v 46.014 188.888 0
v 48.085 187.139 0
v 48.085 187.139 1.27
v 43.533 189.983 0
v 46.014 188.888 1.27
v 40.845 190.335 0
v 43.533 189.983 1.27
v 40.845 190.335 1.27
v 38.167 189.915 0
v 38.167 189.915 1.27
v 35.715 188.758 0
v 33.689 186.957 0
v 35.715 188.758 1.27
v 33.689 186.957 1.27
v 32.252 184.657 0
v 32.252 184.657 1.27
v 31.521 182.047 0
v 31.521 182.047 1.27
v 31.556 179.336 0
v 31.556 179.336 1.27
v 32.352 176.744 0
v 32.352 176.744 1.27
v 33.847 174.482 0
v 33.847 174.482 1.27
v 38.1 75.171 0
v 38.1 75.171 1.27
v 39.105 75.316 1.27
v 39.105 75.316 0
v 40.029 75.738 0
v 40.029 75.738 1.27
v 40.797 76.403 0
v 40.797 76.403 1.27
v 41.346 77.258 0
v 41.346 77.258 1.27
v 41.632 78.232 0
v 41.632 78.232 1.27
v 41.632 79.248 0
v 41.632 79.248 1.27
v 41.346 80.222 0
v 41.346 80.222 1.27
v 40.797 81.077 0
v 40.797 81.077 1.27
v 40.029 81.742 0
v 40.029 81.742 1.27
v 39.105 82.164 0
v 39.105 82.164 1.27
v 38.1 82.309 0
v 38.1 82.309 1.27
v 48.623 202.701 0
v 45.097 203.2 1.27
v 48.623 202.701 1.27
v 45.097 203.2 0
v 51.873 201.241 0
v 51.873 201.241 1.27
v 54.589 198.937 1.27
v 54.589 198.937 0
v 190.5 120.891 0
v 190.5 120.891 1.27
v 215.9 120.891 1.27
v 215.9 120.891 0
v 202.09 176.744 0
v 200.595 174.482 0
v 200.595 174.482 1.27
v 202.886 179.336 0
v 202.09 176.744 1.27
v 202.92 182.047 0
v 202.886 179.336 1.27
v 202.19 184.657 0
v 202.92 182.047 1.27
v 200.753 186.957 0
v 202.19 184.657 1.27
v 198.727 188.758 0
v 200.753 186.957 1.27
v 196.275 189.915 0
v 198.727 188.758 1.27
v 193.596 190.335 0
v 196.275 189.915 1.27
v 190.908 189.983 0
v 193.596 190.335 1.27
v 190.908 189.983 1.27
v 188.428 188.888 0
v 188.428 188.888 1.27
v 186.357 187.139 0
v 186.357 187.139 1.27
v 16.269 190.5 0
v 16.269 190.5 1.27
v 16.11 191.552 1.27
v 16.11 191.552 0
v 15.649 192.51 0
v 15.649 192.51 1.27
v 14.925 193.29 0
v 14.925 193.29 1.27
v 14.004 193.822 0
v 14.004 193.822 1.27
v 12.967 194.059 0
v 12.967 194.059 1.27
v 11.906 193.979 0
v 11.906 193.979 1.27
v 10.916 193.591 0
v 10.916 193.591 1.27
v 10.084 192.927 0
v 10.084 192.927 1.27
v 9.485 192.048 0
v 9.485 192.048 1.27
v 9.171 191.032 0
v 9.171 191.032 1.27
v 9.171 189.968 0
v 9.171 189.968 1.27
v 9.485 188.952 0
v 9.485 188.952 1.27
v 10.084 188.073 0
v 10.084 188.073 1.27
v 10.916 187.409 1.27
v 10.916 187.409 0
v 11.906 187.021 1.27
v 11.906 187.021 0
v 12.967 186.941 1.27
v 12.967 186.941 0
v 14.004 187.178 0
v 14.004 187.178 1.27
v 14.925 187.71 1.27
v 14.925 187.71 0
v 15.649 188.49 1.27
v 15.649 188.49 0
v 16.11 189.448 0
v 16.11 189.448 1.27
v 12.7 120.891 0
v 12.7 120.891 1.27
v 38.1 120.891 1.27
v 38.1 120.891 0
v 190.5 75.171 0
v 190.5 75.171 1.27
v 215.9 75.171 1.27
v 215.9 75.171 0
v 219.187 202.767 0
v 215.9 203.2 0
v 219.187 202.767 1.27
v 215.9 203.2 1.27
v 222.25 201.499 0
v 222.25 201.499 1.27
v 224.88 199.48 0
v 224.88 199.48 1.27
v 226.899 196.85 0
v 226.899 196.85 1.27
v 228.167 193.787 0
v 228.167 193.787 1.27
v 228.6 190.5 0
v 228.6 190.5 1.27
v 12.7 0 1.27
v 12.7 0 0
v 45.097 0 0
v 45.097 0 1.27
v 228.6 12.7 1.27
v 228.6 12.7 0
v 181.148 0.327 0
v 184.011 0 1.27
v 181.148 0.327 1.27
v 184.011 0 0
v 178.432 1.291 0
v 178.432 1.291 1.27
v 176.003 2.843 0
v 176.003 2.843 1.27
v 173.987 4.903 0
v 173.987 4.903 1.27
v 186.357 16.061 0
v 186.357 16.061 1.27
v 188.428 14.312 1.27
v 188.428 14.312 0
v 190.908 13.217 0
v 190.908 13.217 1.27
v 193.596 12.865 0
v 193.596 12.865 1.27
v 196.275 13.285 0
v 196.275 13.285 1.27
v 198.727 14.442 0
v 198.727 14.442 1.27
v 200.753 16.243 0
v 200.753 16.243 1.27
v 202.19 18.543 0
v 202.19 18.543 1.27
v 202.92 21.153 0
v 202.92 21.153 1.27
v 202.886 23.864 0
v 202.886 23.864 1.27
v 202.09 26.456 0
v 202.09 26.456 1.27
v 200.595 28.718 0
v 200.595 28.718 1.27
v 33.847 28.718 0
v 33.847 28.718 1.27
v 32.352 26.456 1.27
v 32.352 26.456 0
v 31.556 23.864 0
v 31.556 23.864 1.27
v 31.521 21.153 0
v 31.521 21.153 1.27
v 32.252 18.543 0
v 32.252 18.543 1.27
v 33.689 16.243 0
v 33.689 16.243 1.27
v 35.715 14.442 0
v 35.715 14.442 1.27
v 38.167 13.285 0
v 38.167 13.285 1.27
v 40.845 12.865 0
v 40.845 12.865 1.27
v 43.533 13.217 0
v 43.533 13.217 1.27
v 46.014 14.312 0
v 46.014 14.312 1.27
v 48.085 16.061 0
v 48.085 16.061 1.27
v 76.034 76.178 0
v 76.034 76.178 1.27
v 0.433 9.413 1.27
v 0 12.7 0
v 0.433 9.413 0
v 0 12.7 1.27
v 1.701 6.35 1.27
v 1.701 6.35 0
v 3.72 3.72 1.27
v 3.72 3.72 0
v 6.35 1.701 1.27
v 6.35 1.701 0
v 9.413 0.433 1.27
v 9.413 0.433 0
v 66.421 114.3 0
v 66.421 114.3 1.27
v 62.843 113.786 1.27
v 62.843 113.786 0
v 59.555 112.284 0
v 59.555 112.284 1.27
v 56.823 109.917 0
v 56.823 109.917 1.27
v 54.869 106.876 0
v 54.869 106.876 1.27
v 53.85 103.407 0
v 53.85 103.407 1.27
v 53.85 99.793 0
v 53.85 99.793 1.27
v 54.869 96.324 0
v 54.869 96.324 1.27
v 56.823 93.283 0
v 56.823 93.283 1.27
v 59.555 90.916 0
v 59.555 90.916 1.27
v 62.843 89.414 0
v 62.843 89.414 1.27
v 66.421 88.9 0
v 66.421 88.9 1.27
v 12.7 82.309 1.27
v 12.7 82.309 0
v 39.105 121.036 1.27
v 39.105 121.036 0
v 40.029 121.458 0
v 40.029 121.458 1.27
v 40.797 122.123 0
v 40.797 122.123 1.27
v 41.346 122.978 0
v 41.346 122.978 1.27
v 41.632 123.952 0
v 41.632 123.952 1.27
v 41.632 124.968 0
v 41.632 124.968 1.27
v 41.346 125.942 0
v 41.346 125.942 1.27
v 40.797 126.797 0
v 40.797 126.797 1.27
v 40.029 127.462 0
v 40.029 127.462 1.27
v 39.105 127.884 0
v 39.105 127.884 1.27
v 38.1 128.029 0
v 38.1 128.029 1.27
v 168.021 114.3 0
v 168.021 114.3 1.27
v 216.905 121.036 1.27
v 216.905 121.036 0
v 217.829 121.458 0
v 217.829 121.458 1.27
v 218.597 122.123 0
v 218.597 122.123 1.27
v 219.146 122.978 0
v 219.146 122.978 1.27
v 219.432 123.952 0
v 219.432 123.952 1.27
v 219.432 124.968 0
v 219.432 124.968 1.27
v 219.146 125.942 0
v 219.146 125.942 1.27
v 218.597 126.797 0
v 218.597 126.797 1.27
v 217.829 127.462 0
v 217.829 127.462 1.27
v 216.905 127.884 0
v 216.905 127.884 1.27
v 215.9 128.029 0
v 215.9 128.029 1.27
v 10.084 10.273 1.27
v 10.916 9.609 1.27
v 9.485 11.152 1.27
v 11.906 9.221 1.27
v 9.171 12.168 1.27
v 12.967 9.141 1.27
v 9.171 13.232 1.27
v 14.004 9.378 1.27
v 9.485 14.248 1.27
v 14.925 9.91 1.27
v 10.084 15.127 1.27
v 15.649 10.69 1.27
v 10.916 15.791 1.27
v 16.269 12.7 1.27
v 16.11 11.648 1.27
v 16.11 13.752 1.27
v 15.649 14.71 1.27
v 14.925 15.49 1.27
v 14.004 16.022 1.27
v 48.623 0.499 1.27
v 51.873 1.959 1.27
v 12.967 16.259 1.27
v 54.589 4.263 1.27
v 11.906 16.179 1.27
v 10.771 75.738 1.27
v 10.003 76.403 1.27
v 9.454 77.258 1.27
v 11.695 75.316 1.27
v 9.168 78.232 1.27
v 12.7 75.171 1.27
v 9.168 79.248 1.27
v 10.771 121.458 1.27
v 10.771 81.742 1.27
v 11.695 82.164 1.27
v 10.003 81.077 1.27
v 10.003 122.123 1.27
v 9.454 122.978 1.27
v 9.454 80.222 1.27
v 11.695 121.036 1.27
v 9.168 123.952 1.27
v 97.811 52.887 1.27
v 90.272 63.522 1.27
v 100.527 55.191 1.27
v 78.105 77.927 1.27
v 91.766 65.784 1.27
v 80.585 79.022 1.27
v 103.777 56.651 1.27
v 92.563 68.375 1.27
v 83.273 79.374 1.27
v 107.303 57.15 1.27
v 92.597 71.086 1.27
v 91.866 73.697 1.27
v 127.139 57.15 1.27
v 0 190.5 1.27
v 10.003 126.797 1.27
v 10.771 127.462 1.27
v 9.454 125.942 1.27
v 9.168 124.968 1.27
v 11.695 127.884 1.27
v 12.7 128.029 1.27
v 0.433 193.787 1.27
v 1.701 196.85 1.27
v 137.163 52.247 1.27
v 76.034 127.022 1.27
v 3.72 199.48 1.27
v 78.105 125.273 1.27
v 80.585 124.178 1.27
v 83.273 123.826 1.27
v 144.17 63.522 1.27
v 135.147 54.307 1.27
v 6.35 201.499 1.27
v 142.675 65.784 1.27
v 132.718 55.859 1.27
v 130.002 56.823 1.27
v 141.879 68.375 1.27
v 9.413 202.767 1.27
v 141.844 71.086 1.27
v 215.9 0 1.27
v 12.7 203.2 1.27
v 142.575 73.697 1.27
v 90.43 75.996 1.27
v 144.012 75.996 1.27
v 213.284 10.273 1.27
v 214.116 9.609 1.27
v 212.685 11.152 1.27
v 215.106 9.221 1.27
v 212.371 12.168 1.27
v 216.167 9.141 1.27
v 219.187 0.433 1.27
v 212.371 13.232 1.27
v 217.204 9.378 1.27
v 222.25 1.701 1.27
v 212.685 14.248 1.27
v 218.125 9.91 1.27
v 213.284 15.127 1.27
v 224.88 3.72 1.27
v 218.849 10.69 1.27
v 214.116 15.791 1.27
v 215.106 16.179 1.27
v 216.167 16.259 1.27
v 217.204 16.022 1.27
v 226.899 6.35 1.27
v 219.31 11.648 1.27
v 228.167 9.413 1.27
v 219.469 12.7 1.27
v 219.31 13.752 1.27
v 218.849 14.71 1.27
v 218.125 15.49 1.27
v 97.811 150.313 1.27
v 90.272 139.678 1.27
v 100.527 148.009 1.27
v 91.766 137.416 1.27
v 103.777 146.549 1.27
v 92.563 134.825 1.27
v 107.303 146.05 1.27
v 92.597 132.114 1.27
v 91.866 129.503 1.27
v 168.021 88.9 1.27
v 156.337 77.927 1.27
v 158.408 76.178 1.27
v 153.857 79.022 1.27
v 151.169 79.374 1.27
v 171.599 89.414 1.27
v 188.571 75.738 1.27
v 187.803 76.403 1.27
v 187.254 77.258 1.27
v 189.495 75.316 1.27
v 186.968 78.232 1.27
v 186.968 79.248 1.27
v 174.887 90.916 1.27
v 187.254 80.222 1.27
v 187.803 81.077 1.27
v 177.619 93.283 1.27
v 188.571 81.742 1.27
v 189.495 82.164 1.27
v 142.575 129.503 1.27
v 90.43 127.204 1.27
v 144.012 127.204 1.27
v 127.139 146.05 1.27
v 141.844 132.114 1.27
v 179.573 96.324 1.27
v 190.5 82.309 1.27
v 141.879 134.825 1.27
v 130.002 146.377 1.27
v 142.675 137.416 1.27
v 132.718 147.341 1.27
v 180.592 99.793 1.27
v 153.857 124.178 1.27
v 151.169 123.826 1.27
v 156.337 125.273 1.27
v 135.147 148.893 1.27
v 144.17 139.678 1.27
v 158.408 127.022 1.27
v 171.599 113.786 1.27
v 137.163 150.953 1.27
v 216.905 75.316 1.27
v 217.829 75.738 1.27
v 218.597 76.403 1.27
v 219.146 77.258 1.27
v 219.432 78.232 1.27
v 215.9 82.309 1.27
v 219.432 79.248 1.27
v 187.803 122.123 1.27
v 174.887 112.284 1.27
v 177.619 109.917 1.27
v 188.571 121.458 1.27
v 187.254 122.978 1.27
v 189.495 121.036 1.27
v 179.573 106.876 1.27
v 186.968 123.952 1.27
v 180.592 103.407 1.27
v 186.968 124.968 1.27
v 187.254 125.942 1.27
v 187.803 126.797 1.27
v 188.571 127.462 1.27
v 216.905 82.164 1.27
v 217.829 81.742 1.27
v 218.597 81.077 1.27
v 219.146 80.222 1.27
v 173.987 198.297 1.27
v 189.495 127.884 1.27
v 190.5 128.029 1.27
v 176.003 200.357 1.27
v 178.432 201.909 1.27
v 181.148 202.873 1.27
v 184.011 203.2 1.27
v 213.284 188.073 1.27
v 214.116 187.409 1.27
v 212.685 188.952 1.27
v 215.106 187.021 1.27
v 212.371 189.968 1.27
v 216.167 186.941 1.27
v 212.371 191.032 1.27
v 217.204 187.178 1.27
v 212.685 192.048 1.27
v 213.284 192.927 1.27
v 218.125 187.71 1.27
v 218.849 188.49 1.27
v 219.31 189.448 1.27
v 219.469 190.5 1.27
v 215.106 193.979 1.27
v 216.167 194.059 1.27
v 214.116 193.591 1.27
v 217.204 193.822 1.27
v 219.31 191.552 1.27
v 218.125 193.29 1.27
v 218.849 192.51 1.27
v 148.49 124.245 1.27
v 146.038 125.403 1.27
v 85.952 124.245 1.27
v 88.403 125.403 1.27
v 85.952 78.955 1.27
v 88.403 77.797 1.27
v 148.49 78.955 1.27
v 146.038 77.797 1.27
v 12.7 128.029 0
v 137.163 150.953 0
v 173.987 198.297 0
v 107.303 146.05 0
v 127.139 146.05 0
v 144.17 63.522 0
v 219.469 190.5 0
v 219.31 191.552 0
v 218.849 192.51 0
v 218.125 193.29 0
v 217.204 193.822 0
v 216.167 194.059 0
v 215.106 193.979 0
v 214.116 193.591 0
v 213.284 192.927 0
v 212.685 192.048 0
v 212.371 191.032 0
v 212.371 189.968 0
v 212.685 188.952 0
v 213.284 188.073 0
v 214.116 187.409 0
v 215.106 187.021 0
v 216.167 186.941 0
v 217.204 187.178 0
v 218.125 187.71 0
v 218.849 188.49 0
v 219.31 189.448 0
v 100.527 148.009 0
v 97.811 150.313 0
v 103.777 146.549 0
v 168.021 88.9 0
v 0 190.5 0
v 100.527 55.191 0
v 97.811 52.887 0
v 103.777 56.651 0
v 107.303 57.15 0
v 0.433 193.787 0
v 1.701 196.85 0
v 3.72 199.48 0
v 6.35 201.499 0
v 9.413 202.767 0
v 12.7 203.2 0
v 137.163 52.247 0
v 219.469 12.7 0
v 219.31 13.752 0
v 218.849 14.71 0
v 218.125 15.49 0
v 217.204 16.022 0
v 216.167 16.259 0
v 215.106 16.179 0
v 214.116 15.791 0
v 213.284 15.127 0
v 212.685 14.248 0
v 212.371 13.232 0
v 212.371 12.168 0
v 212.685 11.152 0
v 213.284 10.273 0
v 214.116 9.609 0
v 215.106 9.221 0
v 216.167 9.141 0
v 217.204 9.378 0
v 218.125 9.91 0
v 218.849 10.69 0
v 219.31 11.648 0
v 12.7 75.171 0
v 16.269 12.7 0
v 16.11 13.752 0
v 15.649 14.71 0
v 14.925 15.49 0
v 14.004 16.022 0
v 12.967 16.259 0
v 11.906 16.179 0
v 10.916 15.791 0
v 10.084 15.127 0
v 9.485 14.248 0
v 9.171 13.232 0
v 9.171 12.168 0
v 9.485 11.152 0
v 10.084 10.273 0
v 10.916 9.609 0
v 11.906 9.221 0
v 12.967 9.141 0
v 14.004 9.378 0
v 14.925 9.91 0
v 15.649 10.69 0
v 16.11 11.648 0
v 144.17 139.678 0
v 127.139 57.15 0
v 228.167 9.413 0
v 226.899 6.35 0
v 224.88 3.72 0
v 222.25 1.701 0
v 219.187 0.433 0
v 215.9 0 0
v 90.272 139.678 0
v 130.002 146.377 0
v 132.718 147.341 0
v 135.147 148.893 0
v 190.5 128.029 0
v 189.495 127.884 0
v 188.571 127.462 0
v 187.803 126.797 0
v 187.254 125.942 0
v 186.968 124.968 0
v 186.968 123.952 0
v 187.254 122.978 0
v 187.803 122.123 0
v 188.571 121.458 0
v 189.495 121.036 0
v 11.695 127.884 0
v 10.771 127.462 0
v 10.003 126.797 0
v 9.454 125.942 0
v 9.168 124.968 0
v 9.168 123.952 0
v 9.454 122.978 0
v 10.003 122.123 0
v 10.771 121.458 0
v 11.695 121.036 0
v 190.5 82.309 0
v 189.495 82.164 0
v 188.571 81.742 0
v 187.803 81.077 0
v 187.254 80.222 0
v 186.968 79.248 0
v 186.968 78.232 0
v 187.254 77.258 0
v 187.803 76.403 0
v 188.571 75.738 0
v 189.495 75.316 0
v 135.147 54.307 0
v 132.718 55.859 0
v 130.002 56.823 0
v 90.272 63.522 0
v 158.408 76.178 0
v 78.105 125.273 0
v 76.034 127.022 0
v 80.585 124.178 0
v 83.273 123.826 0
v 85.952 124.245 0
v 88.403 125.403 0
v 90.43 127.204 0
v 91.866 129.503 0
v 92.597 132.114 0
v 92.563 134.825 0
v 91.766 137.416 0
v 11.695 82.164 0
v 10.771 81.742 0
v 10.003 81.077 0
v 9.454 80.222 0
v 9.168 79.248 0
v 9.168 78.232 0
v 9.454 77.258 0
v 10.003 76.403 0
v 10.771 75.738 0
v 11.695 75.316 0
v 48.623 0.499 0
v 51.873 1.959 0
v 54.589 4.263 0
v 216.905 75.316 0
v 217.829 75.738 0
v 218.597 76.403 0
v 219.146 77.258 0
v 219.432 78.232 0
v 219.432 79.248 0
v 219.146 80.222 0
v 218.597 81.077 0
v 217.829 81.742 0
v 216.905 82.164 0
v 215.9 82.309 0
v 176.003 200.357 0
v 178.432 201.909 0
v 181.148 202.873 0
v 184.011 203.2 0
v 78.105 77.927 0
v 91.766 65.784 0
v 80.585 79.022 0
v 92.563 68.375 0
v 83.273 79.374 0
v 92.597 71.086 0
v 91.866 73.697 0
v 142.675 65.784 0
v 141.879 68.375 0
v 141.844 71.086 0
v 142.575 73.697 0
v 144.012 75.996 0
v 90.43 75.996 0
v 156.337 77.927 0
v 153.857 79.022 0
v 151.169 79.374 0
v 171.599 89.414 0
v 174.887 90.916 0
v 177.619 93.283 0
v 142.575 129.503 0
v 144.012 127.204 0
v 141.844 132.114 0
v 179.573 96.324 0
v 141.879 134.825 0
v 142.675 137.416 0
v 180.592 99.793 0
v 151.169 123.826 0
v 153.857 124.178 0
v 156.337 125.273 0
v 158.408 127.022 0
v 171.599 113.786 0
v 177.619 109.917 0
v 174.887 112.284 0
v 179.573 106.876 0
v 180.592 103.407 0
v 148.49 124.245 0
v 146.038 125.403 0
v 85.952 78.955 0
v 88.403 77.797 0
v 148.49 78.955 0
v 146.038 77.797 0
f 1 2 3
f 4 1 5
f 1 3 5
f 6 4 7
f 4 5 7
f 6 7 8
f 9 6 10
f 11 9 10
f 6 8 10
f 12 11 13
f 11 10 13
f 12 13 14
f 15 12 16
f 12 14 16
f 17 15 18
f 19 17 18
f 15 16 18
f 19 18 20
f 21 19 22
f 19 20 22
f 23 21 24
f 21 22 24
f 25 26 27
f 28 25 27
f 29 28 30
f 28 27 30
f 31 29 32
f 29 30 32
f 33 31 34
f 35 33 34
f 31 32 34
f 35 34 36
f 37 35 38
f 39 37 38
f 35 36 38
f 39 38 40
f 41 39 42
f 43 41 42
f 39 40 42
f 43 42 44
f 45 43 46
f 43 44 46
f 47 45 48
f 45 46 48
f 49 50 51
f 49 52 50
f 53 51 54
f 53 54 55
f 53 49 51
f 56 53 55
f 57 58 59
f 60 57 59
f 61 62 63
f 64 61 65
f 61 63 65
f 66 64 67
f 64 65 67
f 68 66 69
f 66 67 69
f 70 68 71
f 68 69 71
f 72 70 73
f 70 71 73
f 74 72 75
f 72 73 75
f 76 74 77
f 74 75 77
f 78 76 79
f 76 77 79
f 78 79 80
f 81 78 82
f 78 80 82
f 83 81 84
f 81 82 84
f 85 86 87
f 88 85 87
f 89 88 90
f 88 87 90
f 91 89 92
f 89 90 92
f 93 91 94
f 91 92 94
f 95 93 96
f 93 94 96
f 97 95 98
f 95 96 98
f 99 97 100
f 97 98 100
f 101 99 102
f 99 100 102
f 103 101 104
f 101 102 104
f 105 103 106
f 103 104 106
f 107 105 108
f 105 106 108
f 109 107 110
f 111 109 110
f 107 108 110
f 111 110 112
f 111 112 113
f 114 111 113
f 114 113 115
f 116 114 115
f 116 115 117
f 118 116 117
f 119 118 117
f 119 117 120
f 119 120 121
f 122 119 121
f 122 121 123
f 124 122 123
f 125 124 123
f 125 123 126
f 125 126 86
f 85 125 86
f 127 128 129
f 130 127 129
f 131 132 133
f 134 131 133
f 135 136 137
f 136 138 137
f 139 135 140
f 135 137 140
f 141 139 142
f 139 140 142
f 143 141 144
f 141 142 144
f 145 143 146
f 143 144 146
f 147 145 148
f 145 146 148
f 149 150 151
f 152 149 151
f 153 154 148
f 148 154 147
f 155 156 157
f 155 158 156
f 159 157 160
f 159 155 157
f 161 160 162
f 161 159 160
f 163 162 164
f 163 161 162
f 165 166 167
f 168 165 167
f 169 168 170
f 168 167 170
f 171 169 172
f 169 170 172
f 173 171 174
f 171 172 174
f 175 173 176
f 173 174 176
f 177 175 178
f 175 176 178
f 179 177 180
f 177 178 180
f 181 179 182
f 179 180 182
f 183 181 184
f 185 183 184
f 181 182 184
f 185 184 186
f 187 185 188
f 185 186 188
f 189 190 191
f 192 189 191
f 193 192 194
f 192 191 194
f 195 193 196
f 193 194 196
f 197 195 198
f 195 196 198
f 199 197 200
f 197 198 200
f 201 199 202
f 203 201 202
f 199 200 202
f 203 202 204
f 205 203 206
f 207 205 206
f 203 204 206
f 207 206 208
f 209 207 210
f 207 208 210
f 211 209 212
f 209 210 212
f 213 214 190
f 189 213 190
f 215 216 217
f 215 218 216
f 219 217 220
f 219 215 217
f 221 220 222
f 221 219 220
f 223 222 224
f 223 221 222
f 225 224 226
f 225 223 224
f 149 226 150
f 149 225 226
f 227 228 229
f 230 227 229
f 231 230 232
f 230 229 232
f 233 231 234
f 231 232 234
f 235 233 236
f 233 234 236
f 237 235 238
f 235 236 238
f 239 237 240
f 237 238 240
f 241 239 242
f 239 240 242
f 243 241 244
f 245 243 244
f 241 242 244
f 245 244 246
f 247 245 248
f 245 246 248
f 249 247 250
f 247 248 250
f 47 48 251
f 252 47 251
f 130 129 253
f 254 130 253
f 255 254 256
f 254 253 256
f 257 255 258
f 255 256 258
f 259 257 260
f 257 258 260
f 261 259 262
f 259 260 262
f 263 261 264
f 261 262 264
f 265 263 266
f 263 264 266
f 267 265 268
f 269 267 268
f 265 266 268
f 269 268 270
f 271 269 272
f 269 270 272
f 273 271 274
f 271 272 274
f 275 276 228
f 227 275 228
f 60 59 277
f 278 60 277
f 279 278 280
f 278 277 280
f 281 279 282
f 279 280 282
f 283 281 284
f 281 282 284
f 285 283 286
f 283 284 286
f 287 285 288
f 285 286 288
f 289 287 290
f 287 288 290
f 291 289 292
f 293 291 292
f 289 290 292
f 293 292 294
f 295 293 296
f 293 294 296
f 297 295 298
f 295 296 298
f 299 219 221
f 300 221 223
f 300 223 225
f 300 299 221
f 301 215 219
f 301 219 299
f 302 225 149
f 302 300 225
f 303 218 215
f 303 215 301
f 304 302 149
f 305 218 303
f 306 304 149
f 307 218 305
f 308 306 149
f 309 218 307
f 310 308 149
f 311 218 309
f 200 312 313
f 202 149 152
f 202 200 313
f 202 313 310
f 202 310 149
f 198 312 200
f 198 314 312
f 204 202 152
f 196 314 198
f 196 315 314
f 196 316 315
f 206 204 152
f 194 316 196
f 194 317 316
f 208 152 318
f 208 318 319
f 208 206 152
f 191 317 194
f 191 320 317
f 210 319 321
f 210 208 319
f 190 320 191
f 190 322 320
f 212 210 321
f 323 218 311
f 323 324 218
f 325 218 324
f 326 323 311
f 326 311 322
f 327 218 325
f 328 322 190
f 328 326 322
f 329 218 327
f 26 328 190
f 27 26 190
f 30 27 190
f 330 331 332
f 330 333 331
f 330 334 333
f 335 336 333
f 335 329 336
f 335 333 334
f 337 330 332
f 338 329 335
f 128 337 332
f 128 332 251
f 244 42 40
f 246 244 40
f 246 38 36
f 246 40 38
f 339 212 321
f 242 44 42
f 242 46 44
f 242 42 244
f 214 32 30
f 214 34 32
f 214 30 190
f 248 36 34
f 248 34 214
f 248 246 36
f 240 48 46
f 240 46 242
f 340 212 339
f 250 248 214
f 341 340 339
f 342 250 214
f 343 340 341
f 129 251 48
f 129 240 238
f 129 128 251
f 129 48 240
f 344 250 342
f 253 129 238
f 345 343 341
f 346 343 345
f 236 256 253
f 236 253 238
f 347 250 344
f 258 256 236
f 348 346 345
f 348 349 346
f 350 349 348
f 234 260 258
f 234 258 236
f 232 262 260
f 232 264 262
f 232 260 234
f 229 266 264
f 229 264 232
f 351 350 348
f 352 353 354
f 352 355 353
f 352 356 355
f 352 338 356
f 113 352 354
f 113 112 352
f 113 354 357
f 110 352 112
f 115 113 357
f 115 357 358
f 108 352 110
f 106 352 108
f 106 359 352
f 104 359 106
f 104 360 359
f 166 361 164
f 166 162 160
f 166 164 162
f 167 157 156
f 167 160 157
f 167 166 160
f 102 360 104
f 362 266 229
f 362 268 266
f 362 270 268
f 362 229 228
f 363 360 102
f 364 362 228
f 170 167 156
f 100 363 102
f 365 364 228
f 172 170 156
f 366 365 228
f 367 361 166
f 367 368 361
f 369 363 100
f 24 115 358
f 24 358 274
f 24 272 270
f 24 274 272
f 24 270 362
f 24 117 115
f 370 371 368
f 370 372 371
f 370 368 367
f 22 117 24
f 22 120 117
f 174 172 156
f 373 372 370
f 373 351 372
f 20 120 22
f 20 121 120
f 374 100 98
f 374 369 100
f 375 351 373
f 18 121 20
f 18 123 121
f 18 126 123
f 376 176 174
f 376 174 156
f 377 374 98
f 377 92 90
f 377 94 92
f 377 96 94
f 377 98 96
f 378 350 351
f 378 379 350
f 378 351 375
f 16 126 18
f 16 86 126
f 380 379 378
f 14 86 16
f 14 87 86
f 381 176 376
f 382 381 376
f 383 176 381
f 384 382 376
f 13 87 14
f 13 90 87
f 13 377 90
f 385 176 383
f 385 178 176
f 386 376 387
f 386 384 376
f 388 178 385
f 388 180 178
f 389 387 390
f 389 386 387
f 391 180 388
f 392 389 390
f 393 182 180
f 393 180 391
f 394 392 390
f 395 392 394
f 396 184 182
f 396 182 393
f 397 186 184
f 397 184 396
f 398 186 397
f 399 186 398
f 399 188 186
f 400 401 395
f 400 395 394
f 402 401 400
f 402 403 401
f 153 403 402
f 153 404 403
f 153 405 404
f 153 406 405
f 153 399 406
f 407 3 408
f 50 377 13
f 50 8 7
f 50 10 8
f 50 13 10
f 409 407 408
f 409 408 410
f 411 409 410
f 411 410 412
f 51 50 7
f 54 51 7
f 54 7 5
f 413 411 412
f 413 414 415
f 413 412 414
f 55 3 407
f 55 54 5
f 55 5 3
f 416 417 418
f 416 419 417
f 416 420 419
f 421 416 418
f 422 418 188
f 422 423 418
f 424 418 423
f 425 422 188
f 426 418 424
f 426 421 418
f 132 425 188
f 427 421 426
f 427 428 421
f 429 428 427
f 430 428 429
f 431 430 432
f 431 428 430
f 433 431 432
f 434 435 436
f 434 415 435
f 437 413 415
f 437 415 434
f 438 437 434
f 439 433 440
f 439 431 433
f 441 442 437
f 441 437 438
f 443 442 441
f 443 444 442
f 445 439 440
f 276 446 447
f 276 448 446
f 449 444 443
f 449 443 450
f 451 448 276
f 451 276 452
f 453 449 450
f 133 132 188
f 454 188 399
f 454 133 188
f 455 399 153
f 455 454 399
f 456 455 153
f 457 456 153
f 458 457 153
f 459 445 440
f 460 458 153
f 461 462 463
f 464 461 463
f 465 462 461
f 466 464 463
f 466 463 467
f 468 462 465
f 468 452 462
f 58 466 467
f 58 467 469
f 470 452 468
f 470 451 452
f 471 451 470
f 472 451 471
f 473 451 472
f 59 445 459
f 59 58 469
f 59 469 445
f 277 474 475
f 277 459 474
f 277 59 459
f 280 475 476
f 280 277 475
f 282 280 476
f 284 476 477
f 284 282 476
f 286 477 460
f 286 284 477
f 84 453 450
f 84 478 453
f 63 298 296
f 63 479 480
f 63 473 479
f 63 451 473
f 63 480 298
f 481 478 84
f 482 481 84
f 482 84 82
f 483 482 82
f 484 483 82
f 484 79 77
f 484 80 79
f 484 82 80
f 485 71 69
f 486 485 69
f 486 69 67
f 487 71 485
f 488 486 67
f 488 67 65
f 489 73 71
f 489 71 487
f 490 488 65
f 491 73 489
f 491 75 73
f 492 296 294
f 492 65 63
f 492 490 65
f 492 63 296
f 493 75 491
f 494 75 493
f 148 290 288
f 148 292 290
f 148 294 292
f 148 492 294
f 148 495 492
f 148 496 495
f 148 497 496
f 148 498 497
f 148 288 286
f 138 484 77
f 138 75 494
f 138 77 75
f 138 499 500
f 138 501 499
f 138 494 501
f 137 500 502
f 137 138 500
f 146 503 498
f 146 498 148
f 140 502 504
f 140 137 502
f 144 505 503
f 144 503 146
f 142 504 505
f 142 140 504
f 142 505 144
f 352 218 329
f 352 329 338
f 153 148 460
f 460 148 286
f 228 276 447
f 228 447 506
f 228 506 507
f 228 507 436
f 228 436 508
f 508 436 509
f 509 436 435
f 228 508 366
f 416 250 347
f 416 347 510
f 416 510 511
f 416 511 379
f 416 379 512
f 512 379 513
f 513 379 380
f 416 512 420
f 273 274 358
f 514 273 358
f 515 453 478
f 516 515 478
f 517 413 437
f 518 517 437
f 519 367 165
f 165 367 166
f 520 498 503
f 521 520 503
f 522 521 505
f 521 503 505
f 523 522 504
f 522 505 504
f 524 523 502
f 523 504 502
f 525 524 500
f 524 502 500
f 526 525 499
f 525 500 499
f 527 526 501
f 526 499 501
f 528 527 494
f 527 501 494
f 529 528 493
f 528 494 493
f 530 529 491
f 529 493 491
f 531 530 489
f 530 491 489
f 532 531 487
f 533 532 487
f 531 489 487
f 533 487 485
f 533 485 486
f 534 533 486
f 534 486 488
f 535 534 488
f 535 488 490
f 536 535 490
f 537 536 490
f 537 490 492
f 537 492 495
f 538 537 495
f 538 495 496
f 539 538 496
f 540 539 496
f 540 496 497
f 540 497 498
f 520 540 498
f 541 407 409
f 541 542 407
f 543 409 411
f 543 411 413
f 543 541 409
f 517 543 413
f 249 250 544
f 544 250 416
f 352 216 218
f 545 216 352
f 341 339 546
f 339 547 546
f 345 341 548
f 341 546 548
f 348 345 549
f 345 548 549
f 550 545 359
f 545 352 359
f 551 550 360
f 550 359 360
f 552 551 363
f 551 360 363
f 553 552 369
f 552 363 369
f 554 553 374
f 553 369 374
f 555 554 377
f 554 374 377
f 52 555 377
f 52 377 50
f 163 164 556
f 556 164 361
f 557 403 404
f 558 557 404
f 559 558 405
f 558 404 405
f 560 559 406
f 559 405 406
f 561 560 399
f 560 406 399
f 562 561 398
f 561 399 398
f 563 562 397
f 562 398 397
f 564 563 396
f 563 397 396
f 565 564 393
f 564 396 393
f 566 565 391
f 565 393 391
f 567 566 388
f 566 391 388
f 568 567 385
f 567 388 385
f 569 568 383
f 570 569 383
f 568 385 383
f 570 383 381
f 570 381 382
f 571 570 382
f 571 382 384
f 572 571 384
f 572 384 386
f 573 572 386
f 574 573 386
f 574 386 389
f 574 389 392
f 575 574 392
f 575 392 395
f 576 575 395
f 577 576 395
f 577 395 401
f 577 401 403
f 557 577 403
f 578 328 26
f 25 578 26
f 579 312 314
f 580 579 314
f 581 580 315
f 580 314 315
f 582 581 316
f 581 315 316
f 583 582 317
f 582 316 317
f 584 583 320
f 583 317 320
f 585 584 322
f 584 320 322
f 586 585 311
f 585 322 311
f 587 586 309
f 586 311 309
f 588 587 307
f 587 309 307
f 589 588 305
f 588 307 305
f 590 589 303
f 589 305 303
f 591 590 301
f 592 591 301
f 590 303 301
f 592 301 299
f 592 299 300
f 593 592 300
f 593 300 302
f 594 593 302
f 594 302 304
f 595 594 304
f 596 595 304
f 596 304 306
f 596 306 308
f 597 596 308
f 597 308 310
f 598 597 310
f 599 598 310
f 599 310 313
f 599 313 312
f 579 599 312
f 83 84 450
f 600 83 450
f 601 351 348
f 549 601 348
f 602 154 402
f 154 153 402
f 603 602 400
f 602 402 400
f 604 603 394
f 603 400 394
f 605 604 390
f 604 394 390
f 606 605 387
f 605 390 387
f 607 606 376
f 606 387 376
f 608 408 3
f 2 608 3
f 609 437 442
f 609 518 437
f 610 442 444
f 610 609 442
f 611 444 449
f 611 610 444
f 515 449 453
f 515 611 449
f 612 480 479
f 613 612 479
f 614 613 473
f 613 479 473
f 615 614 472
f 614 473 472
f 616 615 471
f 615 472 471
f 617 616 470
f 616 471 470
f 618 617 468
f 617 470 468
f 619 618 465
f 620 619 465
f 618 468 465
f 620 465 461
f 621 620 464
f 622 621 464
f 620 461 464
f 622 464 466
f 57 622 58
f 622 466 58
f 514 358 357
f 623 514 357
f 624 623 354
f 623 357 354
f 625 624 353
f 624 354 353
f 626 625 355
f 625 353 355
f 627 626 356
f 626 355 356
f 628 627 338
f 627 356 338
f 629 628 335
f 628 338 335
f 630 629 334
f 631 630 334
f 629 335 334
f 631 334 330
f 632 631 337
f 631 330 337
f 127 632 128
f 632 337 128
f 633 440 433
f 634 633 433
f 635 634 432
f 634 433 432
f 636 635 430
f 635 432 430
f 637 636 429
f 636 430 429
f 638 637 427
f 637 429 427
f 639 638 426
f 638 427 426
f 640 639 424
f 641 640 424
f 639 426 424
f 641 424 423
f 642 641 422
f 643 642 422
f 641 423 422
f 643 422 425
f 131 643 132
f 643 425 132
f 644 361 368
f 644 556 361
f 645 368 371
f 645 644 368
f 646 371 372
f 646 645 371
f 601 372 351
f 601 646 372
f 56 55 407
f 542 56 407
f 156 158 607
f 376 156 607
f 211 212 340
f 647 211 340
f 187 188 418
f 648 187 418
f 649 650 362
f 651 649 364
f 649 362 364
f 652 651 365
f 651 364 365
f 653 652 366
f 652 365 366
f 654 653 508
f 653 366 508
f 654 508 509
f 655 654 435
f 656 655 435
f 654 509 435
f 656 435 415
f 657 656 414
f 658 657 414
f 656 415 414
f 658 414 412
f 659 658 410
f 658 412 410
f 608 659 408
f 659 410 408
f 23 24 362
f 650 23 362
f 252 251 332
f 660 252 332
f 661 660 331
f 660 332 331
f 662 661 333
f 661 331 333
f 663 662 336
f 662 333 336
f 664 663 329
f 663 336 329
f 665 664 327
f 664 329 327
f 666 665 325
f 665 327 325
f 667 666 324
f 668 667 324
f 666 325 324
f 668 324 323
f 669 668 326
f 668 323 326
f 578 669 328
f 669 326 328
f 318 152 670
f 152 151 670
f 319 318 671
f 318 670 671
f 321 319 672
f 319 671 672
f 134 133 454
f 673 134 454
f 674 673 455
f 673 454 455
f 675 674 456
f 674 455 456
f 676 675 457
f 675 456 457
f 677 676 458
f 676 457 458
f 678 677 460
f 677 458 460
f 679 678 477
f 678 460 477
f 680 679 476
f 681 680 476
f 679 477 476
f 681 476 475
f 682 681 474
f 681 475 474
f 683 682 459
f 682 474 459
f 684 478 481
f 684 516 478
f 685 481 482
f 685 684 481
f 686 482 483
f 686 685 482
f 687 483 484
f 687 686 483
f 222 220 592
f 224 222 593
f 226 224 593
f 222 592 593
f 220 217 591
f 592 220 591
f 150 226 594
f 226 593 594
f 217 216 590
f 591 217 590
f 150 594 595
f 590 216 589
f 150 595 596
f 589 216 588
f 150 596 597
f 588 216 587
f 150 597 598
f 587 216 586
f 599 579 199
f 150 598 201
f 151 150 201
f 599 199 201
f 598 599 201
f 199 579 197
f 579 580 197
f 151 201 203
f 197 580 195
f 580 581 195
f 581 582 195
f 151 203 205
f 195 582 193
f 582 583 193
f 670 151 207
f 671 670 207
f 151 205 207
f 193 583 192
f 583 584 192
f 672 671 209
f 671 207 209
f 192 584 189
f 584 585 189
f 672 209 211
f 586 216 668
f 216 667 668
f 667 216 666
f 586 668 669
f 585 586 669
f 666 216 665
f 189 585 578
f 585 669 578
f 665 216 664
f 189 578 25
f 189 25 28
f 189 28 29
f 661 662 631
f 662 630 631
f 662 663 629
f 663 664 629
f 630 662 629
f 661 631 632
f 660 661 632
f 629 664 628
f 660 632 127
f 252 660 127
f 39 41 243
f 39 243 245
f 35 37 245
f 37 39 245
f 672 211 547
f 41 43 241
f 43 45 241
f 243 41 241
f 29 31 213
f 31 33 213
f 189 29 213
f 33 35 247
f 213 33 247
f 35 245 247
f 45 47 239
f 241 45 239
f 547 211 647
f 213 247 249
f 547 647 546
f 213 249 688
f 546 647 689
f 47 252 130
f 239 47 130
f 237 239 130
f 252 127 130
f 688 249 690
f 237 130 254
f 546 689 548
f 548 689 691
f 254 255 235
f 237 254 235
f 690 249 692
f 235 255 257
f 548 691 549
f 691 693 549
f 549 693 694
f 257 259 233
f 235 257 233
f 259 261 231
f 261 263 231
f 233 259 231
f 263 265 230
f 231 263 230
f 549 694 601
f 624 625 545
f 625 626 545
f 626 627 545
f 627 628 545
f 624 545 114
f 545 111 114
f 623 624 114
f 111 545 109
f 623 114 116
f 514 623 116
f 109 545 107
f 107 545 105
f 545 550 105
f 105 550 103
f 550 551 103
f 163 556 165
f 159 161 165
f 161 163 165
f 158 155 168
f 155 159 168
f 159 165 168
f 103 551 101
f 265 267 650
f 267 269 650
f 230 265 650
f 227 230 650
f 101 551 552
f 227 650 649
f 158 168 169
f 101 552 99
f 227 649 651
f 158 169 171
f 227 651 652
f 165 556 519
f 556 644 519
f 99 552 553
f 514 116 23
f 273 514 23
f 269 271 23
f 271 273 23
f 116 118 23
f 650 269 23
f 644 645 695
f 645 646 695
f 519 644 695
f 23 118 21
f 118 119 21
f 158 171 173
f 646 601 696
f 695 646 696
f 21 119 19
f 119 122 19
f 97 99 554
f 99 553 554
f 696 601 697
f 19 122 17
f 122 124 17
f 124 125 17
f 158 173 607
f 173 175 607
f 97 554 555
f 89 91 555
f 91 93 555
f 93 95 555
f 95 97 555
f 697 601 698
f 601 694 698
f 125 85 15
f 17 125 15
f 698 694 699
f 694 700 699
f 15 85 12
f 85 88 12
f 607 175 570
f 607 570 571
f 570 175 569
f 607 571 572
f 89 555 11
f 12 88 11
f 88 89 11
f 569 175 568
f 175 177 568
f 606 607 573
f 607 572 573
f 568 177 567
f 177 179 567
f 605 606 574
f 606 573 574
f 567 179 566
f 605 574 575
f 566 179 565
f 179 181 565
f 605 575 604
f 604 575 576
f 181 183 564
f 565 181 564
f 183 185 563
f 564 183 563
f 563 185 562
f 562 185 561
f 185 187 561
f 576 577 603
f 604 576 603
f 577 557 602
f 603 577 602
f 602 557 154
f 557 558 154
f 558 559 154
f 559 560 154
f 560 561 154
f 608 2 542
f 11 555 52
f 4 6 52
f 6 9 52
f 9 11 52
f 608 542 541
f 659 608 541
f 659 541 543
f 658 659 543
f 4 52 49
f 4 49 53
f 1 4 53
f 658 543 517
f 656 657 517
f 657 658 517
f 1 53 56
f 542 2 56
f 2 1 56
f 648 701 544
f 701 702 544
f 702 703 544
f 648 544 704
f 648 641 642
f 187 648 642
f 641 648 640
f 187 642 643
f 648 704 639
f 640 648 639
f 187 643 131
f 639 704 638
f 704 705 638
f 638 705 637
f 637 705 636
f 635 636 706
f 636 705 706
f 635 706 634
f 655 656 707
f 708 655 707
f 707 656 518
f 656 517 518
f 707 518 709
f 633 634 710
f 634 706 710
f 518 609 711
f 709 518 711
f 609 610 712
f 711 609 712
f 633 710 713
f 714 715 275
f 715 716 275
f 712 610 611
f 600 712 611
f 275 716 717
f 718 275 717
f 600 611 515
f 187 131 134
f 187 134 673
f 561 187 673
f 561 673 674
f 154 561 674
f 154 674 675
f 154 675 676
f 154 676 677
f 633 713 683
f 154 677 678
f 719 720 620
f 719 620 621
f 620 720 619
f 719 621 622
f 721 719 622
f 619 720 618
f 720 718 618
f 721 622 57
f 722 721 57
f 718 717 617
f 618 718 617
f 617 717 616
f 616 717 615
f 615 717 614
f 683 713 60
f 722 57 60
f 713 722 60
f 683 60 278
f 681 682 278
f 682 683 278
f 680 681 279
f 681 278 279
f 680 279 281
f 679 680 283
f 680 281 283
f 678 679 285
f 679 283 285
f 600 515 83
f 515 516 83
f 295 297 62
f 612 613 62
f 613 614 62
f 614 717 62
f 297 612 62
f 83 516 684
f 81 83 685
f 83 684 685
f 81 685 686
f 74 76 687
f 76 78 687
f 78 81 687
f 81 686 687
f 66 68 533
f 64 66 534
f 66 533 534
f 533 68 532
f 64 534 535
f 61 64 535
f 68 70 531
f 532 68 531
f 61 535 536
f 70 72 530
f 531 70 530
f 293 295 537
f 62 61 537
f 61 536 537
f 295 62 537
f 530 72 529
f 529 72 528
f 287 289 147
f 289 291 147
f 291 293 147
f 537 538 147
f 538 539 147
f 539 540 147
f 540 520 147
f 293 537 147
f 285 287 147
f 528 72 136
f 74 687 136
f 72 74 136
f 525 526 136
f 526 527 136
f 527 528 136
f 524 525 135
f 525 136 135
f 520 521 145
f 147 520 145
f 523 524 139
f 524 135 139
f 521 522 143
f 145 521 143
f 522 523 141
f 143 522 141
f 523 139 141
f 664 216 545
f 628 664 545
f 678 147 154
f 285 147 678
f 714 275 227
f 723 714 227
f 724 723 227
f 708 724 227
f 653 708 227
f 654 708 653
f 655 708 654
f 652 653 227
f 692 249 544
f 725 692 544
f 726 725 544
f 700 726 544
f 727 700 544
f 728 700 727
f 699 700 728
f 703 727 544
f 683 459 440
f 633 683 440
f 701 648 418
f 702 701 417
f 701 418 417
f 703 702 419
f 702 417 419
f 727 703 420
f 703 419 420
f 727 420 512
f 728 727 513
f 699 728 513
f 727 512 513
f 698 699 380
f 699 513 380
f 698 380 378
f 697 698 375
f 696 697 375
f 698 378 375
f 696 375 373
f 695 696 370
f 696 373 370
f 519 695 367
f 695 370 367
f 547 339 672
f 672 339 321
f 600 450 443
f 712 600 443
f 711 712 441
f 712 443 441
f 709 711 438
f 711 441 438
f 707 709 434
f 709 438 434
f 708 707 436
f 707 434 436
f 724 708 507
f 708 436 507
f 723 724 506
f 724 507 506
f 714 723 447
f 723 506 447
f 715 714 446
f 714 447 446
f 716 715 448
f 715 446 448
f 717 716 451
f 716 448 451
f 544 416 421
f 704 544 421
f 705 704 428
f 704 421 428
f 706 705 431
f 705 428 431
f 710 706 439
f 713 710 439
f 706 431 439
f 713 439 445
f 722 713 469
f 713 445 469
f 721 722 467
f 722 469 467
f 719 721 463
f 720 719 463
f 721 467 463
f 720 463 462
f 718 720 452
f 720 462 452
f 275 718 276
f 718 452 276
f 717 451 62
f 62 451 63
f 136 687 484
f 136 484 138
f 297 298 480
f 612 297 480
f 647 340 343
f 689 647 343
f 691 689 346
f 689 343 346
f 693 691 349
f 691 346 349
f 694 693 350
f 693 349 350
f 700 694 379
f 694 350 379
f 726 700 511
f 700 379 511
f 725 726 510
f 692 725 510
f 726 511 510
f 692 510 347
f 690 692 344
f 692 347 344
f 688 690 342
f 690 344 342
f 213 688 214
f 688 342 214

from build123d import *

# Parameters (mm, degrees)
F0_W     = 228.6
F0_H     = 203.2
F1_DEPTH = 1.27
F2_R     = 3.5687
F3_DEPTH = 1.271
F5_DEPTH = 25.4
F6_R     = 12.7
F8_DEPTH = 25.4


with BuildPart() as f1:
    # F0 (on Top) → F1 (new body)
    with BuildSketch(Plane.XY):
        with Locations((114.3, 101.6)):
            Rectangle(F0_W, F0_H)
    extrude(amount=F1_DEPTH)

    # F2 (on face) → F3 (cut, through all)
    with BuildSketch(Plane.XY.offset(1.27)):
        with BuildLine():
            Line((38.1, 128.0287), (12.7, 128.0287))
            ThreePointArc((12.7, 128.0287), (9.1313, 124.46), (12.7, 120.8913))
            Line((12.7, 120.8913), (38.1, 120.8913))
            ThreePointArc((38.1, 120.8913), (41.6687, 124.46), (38.1, 128.0287))
        make_face()
        with BuildLine():
            Line((215.9, 128.0287), (190.5, 128.0287))
            ThreePointArc((190.5, 128.0287), (186.9313, 124.46), (190.5, 120.8913))
            Line((190.5, 120.8913), (215.9, 120.8913))
            ThreePointArc((215.9, 120.8913), (219.4687, 124.46), (215.9, 128.0287))
        make_face()
        with BuildLine():
            Line((38.1, 82.3087), (12.7, 82.3087))
            ThreePointArc((12.7, 82.3087), (9.1313, 78.74), (12.7, 75.1713))
            Line((12.7, 75.1713), (38.1, 75.1713))
            ThreePointArc((38.1, 75.1713), (41.6687, 78.74), (38.1, 82.3087))
        make_face()
        with BuildLine():
            ThreePointArc((190.5, 82.3087), (186.9313, 78.74), (190.5, 75.1713))
            Line((190.5, 75.1713), (215.9, 75.1713))
            ThreePointArc((215.9, 75.1713), (219.4687, 78.74), (215.9, 82.3087))
            Line((215.9, 82.3087), (190.5, 82.3087))
        make_face()
        with Locations((12.7, 190.5)):
            Circle(F2_R)
        with Locations((215.9, 190.5)):
            Circle(F2_R)
        with Locations((12.7, 12.7)):
            Circle(F2_R)
        with Locations((215.9, 12.7)):
            Circle(F2_R)
    extrude(amount=-F3_DEPTH, mode=Mode.SUBTRACT)

    # F4 (on face) → F5 (cut)
    with BuildSketch(Plane.XY.offset(1.27)):
        Polygon((50.8, 203.2), (101.6, 146.05), (133.35, 146.05), (177.8, 203.2), align=None)
        Polygon((133.35, 57.15), (101.6, 57.15), (50.8, 0), (177.8, 0), align=None)
    extrude(amount=-F5_DEPTH, mode=Mode.SUBTRACT)

    # F6
    f6_edges = [f1.edges().sort_by_distance(p)[0] for p in [
        (50.8, 0, 0.635),
        (101.6, 57.15, 0.635),
        (0, 0, 0.635),
        (133.35, 57.15, 0.635),
        (177.8, 0, 0.635),
        (228.6, 0, 0.635),
        (228.6, 203.2, 0.635),
        (177.8, 203.2, 0.635),
        (133.35, 146.05, 0.635),
        (101.6, 146.05, 0.635),
        (50.8, 203.2, 0.635),
        (0, 203.2, 0.635),
    ]]
    fillet(f6_edges, radius=F6_R)

    # F7 (on face) → F8 (cut)
    with BuildSketch(Plane.XY.offset(1.27)):
        with BuildLine():
            Line((90.2719138145, 139.6780655649), (48.0848100488, 187.1385573013))
            ThreePointArc((48.0848100488, 187.1385573013), (34.6376707235, 187.9295654969), (33.8466625279, 174.4824261716))
            Line((33.8466625279, 174.4824261716), (76.0337662936, 127.0219344351))
            ThreePointArc((76.0337662936, 127.0219344351), (89.4809056189, 126.2309262395), (90.2719138145, 139.6780655649))
        make_face()
        with BuildLine():
            ThreePointArc((144.1698608703, 139.6780655649), (144.9608690659, 126.2309262395), (158.4080083912, 127.0219344351))
            Line((158.4080083912, 127.0219344351), (200.5951121569, 174.4824261716))
            ThreePointArc((200.5951121569, 174.4824261716), (199.8041039613, 187.9295654969), (186.356964636, 187.1385573013))
            Line((186.356964636, 187.1385573013), (144.1698608703, 139.6780655649))
        make_face()
        with BuildLine():
            ThreePointArc((90.2719138145, 63.5219344351), (89.4809056189, 76.9690737605), (76.0337662936, 76.1780655649))
            Line((76.0337662936, 76.1780655649), (33.8466625279, 28.7175738284))
            ThreePointArc((33.8466625279, 28.7175738284), (34.6376707235, 15.2704345031), (48.0848100488, 16.0614426987))
            Line((48.0848100488, 16.0614426987), (90.2719138145, 63.5219344351))
        make_face()
        with BuildLine():
            Line((200.5951121569, 28.7175738284), (158.4080083912, 76.1780655649))
            ThreePointArc((158.4080083912, 76.1780655649), (144.9608690659, 76.9690737605), (144.1698608703, 63.5219344351))
            Line((144.1698608703, 63.5219344351), (186.356964636, 16.0614426987))
            ThreePointArc((186.356964636, 16.0614426987), (199.8041039613, 15.2704345031), (200.5951121569, 28.7175738284))
        make_face()
        with BuildLine():
            ThreePointArc((66.4208873424, 114.3), (53.7208873424, 101.6), (66.4208873424, 88.9))
            Line((66.4208873424, 88.9), (117.2208873424, 88.9))
            Line((117.2208873424, 88.9), (168.0208873424, 88.9))
            ThreePointArc((168.0208873424, 88.9), (180.7208873424, 101.6), (168.0208873424, 114.3))
            Line((168.0208873424, 114.3), (117.2208873424, 114.3))
            Line((117.2208873424, 114.3), (66.4208873424, 114.3))
        make_face()
    extrude(amount=-F8_DEPTH, mode=Mode.SUBTRACT)


solid = f1.part
